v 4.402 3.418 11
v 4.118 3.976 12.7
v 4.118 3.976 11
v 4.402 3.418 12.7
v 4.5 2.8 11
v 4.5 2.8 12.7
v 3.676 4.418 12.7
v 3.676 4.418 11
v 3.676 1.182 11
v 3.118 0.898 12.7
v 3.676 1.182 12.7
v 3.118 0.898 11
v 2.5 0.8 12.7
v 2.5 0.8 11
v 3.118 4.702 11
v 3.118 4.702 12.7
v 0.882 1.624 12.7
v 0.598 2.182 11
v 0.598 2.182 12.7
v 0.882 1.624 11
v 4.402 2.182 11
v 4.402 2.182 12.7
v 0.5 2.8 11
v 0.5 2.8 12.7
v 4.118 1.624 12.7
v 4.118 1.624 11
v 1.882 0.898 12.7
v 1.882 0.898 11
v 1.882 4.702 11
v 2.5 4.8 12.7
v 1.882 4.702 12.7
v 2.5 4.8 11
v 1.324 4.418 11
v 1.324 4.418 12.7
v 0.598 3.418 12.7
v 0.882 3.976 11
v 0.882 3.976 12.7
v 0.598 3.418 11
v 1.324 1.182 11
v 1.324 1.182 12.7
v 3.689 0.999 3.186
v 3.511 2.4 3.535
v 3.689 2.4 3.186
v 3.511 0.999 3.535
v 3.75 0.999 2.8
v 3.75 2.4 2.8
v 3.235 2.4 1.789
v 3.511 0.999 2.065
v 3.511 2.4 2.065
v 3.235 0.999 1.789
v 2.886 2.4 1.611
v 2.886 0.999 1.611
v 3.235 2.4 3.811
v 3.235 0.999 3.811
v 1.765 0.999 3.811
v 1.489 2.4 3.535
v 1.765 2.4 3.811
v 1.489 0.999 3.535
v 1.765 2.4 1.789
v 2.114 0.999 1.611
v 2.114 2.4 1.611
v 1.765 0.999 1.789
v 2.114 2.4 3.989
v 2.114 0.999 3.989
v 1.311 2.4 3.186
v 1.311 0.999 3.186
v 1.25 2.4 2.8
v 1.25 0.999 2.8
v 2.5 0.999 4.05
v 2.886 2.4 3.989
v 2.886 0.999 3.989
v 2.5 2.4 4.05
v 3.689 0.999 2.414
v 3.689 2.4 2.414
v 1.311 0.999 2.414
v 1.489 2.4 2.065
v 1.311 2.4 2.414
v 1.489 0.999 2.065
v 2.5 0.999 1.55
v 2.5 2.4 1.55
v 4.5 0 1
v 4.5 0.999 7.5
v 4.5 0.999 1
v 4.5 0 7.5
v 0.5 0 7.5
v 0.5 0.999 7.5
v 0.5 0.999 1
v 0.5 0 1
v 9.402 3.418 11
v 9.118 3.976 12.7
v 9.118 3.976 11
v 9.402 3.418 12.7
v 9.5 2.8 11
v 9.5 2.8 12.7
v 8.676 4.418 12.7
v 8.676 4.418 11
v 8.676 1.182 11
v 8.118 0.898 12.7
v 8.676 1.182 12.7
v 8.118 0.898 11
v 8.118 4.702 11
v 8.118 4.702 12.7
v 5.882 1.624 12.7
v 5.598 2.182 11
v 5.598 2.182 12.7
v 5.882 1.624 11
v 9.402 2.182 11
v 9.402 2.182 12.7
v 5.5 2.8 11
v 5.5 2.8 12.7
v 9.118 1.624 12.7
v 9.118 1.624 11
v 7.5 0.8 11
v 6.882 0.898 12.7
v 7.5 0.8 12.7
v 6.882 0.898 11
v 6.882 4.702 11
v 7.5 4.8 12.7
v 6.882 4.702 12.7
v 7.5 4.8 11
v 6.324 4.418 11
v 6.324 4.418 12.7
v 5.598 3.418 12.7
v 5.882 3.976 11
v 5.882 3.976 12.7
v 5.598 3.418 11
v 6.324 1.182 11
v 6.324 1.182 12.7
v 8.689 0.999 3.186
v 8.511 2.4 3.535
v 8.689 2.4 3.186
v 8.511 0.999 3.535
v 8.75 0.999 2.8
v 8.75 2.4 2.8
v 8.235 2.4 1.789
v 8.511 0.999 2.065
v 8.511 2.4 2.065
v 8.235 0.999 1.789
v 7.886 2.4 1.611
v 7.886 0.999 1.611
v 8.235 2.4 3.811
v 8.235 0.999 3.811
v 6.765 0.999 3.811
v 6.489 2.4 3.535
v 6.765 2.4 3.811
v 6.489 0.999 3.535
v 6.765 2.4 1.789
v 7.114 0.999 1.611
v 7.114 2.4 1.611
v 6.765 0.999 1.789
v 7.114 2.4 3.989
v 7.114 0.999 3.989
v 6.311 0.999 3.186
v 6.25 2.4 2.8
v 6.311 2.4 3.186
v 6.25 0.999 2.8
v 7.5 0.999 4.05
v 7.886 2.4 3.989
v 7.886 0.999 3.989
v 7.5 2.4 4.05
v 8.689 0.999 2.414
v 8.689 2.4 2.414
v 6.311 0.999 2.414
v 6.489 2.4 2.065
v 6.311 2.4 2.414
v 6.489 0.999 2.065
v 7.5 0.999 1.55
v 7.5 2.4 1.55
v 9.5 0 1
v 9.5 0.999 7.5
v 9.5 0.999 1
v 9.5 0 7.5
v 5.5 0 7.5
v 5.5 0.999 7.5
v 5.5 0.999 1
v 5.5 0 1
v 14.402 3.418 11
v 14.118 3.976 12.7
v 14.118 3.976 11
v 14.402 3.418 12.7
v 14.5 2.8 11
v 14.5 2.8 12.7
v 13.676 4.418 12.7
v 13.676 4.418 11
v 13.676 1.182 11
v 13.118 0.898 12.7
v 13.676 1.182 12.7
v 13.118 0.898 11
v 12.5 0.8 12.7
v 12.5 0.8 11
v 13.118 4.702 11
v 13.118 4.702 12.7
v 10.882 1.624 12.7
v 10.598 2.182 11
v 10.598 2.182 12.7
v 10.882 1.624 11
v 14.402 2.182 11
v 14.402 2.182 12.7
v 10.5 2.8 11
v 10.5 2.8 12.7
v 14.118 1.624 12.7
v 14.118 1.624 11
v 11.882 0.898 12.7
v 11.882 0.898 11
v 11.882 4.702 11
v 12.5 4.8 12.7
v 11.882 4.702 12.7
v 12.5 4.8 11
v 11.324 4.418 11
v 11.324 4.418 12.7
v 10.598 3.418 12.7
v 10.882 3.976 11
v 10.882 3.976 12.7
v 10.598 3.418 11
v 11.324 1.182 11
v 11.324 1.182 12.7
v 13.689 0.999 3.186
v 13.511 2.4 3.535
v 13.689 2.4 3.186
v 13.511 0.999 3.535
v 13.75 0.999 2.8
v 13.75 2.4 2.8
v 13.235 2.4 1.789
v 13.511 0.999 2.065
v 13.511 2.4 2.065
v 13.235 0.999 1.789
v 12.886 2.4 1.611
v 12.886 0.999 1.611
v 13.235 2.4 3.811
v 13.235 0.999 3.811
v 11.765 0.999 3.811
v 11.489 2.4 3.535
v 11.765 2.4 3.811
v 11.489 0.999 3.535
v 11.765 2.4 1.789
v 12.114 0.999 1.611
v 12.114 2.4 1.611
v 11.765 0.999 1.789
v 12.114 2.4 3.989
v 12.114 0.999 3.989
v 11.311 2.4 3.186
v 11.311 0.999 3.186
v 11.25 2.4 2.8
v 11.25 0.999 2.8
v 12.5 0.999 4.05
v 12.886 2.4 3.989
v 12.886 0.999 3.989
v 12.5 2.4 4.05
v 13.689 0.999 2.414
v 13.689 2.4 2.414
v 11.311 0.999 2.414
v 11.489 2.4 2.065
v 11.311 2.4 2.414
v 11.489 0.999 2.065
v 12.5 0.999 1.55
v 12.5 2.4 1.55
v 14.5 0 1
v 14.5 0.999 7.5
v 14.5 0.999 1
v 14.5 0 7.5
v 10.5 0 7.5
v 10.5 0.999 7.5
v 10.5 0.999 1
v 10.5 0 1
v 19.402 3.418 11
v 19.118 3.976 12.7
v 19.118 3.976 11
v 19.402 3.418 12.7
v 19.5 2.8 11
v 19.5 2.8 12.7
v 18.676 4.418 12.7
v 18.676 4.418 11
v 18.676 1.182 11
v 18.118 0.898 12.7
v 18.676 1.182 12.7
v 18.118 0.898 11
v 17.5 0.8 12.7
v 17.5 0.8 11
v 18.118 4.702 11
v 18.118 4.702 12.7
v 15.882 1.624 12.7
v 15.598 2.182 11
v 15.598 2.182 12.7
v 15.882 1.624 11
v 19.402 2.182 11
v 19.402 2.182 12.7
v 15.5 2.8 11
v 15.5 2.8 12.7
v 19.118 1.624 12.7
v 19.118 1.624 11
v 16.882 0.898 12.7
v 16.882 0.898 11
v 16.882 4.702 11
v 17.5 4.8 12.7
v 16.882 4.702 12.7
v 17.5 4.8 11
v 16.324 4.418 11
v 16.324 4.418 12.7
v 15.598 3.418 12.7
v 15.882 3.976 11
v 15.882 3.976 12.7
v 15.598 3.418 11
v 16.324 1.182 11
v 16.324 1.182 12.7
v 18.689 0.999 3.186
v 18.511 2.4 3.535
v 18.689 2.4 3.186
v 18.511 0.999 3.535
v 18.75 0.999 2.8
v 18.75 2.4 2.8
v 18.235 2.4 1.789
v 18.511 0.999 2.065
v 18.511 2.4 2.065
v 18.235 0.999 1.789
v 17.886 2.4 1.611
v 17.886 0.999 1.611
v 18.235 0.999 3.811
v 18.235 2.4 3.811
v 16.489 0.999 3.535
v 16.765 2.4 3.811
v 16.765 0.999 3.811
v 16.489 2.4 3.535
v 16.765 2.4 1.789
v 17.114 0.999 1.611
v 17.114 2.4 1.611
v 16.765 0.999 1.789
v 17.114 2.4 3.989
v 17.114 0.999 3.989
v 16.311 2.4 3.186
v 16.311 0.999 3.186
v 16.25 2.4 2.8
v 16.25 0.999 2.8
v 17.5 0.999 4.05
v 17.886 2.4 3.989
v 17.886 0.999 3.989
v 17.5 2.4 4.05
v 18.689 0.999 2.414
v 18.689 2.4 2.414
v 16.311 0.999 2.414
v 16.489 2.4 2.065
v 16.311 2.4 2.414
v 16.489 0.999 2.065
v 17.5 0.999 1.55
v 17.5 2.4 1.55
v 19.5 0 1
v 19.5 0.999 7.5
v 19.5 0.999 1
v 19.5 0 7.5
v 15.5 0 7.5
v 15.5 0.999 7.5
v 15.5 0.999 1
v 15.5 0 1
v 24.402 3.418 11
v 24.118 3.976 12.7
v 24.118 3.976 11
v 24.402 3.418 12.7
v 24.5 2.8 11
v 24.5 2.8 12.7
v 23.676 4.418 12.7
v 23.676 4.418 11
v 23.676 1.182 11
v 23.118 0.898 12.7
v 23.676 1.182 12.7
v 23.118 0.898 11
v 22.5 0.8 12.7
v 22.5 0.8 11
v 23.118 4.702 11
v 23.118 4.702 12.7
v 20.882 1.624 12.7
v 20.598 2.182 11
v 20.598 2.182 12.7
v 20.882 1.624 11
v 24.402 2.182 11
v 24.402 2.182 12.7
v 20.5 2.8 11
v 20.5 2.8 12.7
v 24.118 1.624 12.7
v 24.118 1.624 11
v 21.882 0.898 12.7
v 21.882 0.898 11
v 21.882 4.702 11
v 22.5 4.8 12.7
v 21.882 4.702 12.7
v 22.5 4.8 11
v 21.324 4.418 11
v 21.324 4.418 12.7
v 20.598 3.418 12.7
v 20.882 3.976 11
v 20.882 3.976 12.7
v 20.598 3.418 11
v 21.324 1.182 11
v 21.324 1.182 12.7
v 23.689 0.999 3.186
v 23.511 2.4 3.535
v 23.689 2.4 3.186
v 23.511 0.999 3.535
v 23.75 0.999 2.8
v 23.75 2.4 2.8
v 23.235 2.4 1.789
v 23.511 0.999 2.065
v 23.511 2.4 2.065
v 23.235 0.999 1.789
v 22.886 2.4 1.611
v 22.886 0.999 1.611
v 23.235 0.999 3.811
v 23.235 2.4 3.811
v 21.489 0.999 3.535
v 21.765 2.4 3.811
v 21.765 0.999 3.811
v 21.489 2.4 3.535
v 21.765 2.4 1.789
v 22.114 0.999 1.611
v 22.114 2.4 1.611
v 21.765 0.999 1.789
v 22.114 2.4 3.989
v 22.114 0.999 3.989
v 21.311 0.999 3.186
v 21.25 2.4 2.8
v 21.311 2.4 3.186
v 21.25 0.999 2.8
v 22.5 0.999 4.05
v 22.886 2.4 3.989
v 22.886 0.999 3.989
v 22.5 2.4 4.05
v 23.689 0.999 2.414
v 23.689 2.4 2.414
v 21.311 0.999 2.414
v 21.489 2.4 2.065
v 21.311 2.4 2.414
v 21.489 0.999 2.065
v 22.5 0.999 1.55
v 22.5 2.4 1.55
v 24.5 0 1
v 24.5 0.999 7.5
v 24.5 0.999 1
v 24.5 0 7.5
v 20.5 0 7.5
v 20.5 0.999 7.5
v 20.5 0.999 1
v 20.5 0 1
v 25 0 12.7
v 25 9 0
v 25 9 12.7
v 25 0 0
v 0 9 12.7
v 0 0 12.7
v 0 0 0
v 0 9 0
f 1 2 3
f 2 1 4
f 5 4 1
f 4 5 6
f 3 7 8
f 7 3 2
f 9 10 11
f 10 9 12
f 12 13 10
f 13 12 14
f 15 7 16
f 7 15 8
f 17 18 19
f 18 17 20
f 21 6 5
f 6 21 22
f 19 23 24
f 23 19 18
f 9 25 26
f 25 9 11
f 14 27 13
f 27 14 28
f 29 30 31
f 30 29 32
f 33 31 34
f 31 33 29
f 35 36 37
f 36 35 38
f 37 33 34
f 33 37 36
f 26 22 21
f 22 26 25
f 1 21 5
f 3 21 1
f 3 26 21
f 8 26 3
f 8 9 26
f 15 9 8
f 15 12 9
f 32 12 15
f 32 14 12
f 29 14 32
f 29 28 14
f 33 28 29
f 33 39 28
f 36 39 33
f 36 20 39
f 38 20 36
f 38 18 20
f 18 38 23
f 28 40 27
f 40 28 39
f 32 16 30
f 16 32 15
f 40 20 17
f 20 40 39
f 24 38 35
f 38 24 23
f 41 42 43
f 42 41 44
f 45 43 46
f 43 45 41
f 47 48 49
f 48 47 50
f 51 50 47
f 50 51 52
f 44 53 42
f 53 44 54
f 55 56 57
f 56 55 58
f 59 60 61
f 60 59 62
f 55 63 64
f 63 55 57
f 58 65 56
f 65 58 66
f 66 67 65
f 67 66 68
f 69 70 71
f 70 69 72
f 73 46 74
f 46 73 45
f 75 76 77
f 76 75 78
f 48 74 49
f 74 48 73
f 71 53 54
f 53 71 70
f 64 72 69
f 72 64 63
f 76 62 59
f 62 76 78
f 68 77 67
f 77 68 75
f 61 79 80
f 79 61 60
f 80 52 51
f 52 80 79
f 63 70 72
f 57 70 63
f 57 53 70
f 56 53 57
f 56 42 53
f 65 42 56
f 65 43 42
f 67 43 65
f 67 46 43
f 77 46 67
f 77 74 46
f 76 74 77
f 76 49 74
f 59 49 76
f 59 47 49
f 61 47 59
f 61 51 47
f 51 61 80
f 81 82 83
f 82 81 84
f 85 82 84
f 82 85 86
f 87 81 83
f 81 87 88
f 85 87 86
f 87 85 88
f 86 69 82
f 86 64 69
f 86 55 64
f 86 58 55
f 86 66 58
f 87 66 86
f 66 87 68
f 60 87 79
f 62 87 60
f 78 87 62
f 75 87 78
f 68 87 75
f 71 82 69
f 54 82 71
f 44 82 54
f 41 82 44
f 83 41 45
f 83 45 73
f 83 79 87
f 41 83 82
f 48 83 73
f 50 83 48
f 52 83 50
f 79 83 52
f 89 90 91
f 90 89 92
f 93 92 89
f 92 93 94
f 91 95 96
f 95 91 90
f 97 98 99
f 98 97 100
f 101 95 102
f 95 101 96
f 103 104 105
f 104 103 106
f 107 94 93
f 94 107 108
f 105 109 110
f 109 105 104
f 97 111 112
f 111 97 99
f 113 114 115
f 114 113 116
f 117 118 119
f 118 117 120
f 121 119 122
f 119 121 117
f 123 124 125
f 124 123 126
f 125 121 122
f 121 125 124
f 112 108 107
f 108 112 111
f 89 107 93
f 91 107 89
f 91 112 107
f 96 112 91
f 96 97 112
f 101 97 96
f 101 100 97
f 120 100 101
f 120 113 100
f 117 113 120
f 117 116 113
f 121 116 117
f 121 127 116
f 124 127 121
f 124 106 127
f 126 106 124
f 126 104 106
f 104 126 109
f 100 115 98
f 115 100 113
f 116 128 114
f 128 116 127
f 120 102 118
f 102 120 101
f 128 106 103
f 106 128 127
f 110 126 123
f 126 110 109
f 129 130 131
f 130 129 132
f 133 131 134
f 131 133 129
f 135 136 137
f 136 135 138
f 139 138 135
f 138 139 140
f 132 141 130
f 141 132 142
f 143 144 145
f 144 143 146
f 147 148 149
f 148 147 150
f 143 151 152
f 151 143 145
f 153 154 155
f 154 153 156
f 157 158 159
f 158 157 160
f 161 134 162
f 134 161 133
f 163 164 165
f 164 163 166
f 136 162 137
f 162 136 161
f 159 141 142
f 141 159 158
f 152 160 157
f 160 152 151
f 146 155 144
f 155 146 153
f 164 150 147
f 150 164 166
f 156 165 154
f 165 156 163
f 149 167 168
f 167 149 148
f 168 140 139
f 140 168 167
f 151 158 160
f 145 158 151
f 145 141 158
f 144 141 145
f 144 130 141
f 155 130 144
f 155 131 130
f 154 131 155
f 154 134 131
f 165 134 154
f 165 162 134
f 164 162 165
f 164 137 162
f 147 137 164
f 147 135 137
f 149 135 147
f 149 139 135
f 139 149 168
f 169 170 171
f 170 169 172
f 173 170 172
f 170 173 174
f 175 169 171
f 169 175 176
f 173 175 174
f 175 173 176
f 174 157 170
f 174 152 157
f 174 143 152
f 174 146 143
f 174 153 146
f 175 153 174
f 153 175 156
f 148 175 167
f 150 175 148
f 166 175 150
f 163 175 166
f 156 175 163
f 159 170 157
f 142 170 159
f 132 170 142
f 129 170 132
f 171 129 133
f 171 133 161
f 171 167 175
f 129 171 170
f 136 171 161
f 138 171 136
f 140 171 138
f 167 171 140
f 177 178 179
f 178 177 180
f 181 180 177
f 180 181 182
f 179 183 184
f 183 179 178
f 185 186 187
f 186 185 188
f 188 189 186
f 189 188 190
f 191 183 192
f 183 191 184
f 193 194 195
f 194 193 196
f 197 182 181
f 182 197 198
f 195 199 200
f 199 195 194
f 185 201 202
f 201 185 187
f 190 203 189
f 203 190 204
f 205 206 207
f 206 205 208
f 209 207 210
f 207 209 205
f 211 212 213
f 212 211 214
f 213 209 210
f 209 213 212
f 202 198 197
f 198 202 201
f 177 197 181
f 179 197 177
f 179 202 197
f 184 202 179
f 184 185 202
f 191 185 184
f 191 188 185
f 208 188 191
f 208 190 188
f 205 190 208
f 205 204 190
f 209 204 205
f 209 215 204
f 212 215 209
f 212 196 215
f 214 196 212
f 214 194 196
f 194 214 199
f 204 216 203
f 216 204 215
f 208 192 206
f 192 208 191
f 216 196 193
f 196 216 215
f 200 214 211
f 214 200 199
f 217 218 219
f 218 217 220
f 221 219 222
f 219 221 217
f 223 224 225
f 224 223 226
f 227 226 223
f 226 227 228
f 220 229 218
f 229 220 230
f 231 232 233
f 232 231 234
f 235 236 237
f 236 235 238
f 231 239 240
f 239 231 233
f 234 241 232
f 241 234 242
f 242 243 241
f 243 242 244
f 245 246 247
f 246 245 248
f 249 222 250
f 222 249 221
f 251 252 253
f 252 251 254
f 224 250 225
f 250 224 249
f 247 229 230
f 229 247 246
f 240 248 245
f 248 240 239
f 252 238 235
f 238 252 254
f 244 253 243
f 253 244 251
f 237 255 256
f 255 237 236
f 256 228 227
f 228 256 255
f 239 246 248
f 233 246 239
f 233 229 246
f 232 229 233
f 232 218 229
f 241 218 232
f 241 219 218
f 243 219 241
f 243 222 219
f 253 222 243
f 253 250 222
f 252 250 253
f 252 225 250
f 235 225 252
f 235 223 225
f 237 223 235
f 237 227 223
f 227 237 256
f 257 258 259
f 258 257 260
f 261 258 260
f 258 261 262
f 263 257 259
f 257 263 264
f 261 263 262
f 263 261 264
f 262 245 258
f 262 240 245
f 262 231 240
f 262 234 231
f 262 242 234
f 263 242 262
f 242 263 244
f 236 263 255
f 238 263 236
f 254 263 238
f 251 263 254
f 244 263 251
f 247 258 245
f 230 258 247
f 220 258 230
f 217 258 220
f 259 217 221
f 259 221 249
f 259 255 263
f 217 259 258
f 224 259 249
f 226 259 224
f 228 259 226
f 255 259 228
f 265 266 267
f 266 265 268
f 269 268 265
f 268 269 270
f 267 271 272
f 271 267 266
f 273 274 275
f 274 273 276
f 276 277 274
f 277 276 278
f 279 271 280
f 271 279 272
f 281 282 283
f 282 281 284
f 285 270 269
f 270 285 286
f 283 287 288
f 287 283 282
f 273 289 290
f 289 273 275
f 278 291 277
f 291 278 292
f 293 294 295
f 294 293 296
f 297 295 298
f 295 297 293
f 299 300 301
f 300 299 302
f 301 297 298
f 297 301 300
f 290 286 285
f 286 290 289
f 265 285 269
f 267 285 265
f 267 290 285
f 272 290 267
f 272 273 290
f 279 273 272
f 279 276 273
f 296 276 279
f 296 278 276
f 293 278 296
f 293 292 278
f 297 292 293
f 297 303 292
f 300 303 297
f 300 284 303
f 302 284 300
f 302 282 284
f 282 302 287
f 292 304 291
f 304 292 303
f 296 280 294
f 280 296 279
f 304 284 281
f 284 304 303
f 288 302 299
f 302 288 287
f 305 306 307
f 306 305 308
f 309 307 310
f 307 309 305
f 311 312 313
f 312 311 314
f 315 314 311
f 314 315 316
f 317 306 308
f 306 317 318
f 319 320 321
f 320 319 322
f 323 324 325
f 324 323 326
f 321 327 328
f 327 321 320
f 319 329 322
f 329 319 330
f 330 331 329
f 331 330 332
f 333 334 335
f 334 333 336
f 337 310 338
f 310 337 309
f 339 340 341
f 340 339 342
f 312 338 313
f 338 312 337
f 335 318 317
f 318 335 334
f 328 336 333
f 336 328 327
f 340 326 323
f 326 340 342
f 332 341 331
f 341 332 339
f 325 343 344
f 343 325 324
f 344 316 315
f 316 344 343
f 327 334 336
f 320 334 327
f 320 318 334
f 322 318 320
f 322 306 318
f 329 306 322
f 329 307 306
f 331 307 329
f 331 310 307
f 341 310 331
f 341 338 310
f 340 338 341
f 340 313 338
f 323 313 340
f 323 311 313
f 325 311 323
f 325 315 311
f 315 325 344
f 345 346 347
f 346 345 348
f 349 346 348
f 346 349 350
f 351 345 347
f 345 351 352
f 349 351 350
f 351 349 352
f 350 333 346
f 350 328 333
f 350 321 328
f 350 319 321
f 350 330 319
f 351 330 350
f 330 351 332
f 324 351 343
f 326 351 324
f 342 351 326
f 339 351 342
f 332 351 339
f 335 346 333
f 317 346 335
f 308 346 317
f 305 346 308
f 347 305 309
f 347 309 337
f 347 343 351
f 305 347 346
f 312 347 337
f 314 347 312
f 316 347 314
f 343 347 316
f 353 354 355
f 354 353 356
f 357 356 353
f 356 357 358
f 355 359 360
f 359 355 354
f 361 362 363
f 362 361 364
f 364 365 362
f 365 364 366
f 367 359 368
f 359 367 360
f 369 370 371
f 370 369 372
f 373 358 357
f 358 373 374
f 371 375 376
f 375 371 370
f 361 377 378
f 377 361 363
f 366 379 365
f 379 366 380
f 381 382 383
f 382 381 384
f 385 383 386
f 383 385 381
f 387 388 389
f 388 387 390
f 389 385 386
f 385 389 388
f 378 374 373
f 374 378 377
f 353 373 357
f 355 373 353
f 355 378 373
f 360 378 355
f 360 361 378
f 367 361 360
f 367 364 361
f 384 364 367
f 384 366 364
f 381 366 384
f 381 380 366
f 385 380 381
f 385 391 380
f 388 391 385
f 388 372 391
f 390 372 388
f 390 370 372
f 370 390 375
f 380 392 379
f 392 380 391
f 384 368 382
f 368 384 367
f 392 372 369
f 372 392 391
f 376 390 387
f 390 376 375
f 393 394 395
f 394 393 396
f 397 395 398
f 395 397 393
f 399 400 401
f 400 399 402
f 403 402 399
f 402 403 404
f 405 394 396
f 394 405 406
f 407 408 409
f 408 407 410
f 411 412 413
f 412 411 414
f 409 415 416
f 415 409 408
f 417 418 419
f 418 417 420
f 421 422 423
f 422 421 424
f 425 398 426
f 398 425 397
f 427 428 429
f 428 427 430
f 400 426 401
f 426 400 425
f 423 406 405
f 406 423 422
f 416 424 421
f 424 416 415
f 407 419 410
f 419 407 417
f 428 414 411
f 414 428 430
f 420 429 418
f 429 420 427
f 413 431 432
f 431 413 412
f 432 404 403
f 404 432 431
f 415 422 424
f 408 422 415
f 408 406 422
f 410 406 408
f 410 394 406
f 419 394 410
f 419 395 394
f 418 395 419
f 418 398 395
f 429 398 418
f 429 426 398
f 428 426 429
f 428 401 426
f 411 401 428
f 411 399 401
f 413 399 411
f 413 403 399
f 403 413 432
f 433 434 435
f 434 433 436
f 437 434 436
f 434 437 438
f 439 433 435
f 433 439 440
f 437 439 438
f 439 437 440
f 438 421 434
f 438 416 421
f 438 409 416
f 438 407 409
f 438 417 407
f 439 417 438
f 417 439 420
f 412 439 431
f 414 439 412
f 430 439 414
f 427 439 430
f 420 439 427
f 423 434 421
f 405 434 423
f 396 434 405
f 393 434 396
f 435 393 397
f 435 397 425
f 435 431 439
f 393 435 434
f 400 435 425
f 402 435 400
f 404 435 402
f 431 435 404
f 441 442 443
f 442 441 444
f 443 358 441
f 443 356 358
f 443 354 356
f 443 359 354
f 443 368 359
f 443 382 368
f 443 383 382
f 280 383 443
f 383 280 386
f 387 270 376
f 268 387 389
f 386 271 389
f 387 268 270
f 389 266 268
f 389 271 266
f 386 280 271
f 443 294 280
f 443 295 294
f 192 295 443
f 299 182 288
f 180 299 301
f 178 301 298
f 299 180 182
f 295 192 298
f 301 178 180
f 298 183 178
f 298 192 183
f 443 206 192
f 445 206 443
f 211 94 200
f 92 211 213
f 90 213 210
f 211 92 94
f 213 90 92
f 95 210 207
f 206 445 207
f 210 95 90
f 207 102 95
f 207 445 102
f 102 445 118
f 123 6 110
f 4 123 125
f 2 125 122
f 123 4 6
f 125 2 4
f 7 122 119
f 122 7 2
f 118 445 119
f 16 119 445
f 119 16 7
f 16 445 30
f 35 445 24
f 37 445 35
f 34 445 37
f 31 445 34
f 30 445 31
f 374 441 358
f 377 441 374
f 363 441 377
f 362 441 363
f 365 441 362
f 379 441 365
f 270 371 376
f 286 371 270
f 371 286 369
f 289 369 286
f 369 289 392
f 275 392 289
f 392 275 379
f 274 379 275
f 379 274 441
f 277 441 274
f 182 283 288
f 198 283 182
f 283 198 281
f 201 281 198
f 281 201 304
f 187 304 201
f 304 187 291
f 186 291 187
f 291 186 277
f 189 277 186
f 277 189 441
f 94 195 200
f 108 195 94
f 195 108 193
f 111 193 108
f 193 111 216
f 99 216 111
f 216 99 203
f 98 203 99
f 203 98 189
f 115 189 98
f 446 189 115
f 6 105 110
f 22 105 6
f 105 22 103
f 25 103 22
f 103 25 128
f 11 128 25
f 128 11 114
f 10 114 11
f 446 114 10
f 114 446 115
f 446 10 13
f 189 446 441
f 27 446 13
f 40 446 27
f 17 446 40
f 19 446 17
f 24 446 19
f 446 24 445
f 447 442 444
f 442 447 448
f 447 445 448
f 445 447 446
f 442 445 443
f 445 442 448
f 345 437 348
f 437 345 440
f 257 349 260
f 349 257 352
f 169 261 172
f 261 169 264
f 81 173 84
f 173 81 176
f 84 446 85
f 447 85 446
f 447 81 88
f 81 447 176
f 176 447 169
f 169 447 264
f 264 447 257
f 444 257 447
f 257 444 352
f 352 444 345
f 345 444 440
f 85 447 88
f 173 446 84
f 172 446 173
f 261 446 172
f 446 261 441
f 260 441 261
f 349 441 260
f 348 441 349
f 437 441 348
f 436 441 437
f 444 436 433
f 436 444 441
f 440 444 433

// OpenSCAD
module connectorBlock(n=2,color="green"){
    difference(){
        color(color) cube([n*5,9,12.7]);
        for (i=[0:n-1]){
            color("white") translate([2.5+i*5,2.8,11]) cylinder(d=4,h=2,$fn=20);
            color("grey") rotate([90,0,0]) translate([2.5+i*5,2.8,-2.4]) cylinder(d=2.5,h=2,$fn=20);
            color("white") translate([0.5+i*5,-0.001,1]) cube([4,1,6.5]);
        }
    }
}
connectorBlock(n=5,color="green");
